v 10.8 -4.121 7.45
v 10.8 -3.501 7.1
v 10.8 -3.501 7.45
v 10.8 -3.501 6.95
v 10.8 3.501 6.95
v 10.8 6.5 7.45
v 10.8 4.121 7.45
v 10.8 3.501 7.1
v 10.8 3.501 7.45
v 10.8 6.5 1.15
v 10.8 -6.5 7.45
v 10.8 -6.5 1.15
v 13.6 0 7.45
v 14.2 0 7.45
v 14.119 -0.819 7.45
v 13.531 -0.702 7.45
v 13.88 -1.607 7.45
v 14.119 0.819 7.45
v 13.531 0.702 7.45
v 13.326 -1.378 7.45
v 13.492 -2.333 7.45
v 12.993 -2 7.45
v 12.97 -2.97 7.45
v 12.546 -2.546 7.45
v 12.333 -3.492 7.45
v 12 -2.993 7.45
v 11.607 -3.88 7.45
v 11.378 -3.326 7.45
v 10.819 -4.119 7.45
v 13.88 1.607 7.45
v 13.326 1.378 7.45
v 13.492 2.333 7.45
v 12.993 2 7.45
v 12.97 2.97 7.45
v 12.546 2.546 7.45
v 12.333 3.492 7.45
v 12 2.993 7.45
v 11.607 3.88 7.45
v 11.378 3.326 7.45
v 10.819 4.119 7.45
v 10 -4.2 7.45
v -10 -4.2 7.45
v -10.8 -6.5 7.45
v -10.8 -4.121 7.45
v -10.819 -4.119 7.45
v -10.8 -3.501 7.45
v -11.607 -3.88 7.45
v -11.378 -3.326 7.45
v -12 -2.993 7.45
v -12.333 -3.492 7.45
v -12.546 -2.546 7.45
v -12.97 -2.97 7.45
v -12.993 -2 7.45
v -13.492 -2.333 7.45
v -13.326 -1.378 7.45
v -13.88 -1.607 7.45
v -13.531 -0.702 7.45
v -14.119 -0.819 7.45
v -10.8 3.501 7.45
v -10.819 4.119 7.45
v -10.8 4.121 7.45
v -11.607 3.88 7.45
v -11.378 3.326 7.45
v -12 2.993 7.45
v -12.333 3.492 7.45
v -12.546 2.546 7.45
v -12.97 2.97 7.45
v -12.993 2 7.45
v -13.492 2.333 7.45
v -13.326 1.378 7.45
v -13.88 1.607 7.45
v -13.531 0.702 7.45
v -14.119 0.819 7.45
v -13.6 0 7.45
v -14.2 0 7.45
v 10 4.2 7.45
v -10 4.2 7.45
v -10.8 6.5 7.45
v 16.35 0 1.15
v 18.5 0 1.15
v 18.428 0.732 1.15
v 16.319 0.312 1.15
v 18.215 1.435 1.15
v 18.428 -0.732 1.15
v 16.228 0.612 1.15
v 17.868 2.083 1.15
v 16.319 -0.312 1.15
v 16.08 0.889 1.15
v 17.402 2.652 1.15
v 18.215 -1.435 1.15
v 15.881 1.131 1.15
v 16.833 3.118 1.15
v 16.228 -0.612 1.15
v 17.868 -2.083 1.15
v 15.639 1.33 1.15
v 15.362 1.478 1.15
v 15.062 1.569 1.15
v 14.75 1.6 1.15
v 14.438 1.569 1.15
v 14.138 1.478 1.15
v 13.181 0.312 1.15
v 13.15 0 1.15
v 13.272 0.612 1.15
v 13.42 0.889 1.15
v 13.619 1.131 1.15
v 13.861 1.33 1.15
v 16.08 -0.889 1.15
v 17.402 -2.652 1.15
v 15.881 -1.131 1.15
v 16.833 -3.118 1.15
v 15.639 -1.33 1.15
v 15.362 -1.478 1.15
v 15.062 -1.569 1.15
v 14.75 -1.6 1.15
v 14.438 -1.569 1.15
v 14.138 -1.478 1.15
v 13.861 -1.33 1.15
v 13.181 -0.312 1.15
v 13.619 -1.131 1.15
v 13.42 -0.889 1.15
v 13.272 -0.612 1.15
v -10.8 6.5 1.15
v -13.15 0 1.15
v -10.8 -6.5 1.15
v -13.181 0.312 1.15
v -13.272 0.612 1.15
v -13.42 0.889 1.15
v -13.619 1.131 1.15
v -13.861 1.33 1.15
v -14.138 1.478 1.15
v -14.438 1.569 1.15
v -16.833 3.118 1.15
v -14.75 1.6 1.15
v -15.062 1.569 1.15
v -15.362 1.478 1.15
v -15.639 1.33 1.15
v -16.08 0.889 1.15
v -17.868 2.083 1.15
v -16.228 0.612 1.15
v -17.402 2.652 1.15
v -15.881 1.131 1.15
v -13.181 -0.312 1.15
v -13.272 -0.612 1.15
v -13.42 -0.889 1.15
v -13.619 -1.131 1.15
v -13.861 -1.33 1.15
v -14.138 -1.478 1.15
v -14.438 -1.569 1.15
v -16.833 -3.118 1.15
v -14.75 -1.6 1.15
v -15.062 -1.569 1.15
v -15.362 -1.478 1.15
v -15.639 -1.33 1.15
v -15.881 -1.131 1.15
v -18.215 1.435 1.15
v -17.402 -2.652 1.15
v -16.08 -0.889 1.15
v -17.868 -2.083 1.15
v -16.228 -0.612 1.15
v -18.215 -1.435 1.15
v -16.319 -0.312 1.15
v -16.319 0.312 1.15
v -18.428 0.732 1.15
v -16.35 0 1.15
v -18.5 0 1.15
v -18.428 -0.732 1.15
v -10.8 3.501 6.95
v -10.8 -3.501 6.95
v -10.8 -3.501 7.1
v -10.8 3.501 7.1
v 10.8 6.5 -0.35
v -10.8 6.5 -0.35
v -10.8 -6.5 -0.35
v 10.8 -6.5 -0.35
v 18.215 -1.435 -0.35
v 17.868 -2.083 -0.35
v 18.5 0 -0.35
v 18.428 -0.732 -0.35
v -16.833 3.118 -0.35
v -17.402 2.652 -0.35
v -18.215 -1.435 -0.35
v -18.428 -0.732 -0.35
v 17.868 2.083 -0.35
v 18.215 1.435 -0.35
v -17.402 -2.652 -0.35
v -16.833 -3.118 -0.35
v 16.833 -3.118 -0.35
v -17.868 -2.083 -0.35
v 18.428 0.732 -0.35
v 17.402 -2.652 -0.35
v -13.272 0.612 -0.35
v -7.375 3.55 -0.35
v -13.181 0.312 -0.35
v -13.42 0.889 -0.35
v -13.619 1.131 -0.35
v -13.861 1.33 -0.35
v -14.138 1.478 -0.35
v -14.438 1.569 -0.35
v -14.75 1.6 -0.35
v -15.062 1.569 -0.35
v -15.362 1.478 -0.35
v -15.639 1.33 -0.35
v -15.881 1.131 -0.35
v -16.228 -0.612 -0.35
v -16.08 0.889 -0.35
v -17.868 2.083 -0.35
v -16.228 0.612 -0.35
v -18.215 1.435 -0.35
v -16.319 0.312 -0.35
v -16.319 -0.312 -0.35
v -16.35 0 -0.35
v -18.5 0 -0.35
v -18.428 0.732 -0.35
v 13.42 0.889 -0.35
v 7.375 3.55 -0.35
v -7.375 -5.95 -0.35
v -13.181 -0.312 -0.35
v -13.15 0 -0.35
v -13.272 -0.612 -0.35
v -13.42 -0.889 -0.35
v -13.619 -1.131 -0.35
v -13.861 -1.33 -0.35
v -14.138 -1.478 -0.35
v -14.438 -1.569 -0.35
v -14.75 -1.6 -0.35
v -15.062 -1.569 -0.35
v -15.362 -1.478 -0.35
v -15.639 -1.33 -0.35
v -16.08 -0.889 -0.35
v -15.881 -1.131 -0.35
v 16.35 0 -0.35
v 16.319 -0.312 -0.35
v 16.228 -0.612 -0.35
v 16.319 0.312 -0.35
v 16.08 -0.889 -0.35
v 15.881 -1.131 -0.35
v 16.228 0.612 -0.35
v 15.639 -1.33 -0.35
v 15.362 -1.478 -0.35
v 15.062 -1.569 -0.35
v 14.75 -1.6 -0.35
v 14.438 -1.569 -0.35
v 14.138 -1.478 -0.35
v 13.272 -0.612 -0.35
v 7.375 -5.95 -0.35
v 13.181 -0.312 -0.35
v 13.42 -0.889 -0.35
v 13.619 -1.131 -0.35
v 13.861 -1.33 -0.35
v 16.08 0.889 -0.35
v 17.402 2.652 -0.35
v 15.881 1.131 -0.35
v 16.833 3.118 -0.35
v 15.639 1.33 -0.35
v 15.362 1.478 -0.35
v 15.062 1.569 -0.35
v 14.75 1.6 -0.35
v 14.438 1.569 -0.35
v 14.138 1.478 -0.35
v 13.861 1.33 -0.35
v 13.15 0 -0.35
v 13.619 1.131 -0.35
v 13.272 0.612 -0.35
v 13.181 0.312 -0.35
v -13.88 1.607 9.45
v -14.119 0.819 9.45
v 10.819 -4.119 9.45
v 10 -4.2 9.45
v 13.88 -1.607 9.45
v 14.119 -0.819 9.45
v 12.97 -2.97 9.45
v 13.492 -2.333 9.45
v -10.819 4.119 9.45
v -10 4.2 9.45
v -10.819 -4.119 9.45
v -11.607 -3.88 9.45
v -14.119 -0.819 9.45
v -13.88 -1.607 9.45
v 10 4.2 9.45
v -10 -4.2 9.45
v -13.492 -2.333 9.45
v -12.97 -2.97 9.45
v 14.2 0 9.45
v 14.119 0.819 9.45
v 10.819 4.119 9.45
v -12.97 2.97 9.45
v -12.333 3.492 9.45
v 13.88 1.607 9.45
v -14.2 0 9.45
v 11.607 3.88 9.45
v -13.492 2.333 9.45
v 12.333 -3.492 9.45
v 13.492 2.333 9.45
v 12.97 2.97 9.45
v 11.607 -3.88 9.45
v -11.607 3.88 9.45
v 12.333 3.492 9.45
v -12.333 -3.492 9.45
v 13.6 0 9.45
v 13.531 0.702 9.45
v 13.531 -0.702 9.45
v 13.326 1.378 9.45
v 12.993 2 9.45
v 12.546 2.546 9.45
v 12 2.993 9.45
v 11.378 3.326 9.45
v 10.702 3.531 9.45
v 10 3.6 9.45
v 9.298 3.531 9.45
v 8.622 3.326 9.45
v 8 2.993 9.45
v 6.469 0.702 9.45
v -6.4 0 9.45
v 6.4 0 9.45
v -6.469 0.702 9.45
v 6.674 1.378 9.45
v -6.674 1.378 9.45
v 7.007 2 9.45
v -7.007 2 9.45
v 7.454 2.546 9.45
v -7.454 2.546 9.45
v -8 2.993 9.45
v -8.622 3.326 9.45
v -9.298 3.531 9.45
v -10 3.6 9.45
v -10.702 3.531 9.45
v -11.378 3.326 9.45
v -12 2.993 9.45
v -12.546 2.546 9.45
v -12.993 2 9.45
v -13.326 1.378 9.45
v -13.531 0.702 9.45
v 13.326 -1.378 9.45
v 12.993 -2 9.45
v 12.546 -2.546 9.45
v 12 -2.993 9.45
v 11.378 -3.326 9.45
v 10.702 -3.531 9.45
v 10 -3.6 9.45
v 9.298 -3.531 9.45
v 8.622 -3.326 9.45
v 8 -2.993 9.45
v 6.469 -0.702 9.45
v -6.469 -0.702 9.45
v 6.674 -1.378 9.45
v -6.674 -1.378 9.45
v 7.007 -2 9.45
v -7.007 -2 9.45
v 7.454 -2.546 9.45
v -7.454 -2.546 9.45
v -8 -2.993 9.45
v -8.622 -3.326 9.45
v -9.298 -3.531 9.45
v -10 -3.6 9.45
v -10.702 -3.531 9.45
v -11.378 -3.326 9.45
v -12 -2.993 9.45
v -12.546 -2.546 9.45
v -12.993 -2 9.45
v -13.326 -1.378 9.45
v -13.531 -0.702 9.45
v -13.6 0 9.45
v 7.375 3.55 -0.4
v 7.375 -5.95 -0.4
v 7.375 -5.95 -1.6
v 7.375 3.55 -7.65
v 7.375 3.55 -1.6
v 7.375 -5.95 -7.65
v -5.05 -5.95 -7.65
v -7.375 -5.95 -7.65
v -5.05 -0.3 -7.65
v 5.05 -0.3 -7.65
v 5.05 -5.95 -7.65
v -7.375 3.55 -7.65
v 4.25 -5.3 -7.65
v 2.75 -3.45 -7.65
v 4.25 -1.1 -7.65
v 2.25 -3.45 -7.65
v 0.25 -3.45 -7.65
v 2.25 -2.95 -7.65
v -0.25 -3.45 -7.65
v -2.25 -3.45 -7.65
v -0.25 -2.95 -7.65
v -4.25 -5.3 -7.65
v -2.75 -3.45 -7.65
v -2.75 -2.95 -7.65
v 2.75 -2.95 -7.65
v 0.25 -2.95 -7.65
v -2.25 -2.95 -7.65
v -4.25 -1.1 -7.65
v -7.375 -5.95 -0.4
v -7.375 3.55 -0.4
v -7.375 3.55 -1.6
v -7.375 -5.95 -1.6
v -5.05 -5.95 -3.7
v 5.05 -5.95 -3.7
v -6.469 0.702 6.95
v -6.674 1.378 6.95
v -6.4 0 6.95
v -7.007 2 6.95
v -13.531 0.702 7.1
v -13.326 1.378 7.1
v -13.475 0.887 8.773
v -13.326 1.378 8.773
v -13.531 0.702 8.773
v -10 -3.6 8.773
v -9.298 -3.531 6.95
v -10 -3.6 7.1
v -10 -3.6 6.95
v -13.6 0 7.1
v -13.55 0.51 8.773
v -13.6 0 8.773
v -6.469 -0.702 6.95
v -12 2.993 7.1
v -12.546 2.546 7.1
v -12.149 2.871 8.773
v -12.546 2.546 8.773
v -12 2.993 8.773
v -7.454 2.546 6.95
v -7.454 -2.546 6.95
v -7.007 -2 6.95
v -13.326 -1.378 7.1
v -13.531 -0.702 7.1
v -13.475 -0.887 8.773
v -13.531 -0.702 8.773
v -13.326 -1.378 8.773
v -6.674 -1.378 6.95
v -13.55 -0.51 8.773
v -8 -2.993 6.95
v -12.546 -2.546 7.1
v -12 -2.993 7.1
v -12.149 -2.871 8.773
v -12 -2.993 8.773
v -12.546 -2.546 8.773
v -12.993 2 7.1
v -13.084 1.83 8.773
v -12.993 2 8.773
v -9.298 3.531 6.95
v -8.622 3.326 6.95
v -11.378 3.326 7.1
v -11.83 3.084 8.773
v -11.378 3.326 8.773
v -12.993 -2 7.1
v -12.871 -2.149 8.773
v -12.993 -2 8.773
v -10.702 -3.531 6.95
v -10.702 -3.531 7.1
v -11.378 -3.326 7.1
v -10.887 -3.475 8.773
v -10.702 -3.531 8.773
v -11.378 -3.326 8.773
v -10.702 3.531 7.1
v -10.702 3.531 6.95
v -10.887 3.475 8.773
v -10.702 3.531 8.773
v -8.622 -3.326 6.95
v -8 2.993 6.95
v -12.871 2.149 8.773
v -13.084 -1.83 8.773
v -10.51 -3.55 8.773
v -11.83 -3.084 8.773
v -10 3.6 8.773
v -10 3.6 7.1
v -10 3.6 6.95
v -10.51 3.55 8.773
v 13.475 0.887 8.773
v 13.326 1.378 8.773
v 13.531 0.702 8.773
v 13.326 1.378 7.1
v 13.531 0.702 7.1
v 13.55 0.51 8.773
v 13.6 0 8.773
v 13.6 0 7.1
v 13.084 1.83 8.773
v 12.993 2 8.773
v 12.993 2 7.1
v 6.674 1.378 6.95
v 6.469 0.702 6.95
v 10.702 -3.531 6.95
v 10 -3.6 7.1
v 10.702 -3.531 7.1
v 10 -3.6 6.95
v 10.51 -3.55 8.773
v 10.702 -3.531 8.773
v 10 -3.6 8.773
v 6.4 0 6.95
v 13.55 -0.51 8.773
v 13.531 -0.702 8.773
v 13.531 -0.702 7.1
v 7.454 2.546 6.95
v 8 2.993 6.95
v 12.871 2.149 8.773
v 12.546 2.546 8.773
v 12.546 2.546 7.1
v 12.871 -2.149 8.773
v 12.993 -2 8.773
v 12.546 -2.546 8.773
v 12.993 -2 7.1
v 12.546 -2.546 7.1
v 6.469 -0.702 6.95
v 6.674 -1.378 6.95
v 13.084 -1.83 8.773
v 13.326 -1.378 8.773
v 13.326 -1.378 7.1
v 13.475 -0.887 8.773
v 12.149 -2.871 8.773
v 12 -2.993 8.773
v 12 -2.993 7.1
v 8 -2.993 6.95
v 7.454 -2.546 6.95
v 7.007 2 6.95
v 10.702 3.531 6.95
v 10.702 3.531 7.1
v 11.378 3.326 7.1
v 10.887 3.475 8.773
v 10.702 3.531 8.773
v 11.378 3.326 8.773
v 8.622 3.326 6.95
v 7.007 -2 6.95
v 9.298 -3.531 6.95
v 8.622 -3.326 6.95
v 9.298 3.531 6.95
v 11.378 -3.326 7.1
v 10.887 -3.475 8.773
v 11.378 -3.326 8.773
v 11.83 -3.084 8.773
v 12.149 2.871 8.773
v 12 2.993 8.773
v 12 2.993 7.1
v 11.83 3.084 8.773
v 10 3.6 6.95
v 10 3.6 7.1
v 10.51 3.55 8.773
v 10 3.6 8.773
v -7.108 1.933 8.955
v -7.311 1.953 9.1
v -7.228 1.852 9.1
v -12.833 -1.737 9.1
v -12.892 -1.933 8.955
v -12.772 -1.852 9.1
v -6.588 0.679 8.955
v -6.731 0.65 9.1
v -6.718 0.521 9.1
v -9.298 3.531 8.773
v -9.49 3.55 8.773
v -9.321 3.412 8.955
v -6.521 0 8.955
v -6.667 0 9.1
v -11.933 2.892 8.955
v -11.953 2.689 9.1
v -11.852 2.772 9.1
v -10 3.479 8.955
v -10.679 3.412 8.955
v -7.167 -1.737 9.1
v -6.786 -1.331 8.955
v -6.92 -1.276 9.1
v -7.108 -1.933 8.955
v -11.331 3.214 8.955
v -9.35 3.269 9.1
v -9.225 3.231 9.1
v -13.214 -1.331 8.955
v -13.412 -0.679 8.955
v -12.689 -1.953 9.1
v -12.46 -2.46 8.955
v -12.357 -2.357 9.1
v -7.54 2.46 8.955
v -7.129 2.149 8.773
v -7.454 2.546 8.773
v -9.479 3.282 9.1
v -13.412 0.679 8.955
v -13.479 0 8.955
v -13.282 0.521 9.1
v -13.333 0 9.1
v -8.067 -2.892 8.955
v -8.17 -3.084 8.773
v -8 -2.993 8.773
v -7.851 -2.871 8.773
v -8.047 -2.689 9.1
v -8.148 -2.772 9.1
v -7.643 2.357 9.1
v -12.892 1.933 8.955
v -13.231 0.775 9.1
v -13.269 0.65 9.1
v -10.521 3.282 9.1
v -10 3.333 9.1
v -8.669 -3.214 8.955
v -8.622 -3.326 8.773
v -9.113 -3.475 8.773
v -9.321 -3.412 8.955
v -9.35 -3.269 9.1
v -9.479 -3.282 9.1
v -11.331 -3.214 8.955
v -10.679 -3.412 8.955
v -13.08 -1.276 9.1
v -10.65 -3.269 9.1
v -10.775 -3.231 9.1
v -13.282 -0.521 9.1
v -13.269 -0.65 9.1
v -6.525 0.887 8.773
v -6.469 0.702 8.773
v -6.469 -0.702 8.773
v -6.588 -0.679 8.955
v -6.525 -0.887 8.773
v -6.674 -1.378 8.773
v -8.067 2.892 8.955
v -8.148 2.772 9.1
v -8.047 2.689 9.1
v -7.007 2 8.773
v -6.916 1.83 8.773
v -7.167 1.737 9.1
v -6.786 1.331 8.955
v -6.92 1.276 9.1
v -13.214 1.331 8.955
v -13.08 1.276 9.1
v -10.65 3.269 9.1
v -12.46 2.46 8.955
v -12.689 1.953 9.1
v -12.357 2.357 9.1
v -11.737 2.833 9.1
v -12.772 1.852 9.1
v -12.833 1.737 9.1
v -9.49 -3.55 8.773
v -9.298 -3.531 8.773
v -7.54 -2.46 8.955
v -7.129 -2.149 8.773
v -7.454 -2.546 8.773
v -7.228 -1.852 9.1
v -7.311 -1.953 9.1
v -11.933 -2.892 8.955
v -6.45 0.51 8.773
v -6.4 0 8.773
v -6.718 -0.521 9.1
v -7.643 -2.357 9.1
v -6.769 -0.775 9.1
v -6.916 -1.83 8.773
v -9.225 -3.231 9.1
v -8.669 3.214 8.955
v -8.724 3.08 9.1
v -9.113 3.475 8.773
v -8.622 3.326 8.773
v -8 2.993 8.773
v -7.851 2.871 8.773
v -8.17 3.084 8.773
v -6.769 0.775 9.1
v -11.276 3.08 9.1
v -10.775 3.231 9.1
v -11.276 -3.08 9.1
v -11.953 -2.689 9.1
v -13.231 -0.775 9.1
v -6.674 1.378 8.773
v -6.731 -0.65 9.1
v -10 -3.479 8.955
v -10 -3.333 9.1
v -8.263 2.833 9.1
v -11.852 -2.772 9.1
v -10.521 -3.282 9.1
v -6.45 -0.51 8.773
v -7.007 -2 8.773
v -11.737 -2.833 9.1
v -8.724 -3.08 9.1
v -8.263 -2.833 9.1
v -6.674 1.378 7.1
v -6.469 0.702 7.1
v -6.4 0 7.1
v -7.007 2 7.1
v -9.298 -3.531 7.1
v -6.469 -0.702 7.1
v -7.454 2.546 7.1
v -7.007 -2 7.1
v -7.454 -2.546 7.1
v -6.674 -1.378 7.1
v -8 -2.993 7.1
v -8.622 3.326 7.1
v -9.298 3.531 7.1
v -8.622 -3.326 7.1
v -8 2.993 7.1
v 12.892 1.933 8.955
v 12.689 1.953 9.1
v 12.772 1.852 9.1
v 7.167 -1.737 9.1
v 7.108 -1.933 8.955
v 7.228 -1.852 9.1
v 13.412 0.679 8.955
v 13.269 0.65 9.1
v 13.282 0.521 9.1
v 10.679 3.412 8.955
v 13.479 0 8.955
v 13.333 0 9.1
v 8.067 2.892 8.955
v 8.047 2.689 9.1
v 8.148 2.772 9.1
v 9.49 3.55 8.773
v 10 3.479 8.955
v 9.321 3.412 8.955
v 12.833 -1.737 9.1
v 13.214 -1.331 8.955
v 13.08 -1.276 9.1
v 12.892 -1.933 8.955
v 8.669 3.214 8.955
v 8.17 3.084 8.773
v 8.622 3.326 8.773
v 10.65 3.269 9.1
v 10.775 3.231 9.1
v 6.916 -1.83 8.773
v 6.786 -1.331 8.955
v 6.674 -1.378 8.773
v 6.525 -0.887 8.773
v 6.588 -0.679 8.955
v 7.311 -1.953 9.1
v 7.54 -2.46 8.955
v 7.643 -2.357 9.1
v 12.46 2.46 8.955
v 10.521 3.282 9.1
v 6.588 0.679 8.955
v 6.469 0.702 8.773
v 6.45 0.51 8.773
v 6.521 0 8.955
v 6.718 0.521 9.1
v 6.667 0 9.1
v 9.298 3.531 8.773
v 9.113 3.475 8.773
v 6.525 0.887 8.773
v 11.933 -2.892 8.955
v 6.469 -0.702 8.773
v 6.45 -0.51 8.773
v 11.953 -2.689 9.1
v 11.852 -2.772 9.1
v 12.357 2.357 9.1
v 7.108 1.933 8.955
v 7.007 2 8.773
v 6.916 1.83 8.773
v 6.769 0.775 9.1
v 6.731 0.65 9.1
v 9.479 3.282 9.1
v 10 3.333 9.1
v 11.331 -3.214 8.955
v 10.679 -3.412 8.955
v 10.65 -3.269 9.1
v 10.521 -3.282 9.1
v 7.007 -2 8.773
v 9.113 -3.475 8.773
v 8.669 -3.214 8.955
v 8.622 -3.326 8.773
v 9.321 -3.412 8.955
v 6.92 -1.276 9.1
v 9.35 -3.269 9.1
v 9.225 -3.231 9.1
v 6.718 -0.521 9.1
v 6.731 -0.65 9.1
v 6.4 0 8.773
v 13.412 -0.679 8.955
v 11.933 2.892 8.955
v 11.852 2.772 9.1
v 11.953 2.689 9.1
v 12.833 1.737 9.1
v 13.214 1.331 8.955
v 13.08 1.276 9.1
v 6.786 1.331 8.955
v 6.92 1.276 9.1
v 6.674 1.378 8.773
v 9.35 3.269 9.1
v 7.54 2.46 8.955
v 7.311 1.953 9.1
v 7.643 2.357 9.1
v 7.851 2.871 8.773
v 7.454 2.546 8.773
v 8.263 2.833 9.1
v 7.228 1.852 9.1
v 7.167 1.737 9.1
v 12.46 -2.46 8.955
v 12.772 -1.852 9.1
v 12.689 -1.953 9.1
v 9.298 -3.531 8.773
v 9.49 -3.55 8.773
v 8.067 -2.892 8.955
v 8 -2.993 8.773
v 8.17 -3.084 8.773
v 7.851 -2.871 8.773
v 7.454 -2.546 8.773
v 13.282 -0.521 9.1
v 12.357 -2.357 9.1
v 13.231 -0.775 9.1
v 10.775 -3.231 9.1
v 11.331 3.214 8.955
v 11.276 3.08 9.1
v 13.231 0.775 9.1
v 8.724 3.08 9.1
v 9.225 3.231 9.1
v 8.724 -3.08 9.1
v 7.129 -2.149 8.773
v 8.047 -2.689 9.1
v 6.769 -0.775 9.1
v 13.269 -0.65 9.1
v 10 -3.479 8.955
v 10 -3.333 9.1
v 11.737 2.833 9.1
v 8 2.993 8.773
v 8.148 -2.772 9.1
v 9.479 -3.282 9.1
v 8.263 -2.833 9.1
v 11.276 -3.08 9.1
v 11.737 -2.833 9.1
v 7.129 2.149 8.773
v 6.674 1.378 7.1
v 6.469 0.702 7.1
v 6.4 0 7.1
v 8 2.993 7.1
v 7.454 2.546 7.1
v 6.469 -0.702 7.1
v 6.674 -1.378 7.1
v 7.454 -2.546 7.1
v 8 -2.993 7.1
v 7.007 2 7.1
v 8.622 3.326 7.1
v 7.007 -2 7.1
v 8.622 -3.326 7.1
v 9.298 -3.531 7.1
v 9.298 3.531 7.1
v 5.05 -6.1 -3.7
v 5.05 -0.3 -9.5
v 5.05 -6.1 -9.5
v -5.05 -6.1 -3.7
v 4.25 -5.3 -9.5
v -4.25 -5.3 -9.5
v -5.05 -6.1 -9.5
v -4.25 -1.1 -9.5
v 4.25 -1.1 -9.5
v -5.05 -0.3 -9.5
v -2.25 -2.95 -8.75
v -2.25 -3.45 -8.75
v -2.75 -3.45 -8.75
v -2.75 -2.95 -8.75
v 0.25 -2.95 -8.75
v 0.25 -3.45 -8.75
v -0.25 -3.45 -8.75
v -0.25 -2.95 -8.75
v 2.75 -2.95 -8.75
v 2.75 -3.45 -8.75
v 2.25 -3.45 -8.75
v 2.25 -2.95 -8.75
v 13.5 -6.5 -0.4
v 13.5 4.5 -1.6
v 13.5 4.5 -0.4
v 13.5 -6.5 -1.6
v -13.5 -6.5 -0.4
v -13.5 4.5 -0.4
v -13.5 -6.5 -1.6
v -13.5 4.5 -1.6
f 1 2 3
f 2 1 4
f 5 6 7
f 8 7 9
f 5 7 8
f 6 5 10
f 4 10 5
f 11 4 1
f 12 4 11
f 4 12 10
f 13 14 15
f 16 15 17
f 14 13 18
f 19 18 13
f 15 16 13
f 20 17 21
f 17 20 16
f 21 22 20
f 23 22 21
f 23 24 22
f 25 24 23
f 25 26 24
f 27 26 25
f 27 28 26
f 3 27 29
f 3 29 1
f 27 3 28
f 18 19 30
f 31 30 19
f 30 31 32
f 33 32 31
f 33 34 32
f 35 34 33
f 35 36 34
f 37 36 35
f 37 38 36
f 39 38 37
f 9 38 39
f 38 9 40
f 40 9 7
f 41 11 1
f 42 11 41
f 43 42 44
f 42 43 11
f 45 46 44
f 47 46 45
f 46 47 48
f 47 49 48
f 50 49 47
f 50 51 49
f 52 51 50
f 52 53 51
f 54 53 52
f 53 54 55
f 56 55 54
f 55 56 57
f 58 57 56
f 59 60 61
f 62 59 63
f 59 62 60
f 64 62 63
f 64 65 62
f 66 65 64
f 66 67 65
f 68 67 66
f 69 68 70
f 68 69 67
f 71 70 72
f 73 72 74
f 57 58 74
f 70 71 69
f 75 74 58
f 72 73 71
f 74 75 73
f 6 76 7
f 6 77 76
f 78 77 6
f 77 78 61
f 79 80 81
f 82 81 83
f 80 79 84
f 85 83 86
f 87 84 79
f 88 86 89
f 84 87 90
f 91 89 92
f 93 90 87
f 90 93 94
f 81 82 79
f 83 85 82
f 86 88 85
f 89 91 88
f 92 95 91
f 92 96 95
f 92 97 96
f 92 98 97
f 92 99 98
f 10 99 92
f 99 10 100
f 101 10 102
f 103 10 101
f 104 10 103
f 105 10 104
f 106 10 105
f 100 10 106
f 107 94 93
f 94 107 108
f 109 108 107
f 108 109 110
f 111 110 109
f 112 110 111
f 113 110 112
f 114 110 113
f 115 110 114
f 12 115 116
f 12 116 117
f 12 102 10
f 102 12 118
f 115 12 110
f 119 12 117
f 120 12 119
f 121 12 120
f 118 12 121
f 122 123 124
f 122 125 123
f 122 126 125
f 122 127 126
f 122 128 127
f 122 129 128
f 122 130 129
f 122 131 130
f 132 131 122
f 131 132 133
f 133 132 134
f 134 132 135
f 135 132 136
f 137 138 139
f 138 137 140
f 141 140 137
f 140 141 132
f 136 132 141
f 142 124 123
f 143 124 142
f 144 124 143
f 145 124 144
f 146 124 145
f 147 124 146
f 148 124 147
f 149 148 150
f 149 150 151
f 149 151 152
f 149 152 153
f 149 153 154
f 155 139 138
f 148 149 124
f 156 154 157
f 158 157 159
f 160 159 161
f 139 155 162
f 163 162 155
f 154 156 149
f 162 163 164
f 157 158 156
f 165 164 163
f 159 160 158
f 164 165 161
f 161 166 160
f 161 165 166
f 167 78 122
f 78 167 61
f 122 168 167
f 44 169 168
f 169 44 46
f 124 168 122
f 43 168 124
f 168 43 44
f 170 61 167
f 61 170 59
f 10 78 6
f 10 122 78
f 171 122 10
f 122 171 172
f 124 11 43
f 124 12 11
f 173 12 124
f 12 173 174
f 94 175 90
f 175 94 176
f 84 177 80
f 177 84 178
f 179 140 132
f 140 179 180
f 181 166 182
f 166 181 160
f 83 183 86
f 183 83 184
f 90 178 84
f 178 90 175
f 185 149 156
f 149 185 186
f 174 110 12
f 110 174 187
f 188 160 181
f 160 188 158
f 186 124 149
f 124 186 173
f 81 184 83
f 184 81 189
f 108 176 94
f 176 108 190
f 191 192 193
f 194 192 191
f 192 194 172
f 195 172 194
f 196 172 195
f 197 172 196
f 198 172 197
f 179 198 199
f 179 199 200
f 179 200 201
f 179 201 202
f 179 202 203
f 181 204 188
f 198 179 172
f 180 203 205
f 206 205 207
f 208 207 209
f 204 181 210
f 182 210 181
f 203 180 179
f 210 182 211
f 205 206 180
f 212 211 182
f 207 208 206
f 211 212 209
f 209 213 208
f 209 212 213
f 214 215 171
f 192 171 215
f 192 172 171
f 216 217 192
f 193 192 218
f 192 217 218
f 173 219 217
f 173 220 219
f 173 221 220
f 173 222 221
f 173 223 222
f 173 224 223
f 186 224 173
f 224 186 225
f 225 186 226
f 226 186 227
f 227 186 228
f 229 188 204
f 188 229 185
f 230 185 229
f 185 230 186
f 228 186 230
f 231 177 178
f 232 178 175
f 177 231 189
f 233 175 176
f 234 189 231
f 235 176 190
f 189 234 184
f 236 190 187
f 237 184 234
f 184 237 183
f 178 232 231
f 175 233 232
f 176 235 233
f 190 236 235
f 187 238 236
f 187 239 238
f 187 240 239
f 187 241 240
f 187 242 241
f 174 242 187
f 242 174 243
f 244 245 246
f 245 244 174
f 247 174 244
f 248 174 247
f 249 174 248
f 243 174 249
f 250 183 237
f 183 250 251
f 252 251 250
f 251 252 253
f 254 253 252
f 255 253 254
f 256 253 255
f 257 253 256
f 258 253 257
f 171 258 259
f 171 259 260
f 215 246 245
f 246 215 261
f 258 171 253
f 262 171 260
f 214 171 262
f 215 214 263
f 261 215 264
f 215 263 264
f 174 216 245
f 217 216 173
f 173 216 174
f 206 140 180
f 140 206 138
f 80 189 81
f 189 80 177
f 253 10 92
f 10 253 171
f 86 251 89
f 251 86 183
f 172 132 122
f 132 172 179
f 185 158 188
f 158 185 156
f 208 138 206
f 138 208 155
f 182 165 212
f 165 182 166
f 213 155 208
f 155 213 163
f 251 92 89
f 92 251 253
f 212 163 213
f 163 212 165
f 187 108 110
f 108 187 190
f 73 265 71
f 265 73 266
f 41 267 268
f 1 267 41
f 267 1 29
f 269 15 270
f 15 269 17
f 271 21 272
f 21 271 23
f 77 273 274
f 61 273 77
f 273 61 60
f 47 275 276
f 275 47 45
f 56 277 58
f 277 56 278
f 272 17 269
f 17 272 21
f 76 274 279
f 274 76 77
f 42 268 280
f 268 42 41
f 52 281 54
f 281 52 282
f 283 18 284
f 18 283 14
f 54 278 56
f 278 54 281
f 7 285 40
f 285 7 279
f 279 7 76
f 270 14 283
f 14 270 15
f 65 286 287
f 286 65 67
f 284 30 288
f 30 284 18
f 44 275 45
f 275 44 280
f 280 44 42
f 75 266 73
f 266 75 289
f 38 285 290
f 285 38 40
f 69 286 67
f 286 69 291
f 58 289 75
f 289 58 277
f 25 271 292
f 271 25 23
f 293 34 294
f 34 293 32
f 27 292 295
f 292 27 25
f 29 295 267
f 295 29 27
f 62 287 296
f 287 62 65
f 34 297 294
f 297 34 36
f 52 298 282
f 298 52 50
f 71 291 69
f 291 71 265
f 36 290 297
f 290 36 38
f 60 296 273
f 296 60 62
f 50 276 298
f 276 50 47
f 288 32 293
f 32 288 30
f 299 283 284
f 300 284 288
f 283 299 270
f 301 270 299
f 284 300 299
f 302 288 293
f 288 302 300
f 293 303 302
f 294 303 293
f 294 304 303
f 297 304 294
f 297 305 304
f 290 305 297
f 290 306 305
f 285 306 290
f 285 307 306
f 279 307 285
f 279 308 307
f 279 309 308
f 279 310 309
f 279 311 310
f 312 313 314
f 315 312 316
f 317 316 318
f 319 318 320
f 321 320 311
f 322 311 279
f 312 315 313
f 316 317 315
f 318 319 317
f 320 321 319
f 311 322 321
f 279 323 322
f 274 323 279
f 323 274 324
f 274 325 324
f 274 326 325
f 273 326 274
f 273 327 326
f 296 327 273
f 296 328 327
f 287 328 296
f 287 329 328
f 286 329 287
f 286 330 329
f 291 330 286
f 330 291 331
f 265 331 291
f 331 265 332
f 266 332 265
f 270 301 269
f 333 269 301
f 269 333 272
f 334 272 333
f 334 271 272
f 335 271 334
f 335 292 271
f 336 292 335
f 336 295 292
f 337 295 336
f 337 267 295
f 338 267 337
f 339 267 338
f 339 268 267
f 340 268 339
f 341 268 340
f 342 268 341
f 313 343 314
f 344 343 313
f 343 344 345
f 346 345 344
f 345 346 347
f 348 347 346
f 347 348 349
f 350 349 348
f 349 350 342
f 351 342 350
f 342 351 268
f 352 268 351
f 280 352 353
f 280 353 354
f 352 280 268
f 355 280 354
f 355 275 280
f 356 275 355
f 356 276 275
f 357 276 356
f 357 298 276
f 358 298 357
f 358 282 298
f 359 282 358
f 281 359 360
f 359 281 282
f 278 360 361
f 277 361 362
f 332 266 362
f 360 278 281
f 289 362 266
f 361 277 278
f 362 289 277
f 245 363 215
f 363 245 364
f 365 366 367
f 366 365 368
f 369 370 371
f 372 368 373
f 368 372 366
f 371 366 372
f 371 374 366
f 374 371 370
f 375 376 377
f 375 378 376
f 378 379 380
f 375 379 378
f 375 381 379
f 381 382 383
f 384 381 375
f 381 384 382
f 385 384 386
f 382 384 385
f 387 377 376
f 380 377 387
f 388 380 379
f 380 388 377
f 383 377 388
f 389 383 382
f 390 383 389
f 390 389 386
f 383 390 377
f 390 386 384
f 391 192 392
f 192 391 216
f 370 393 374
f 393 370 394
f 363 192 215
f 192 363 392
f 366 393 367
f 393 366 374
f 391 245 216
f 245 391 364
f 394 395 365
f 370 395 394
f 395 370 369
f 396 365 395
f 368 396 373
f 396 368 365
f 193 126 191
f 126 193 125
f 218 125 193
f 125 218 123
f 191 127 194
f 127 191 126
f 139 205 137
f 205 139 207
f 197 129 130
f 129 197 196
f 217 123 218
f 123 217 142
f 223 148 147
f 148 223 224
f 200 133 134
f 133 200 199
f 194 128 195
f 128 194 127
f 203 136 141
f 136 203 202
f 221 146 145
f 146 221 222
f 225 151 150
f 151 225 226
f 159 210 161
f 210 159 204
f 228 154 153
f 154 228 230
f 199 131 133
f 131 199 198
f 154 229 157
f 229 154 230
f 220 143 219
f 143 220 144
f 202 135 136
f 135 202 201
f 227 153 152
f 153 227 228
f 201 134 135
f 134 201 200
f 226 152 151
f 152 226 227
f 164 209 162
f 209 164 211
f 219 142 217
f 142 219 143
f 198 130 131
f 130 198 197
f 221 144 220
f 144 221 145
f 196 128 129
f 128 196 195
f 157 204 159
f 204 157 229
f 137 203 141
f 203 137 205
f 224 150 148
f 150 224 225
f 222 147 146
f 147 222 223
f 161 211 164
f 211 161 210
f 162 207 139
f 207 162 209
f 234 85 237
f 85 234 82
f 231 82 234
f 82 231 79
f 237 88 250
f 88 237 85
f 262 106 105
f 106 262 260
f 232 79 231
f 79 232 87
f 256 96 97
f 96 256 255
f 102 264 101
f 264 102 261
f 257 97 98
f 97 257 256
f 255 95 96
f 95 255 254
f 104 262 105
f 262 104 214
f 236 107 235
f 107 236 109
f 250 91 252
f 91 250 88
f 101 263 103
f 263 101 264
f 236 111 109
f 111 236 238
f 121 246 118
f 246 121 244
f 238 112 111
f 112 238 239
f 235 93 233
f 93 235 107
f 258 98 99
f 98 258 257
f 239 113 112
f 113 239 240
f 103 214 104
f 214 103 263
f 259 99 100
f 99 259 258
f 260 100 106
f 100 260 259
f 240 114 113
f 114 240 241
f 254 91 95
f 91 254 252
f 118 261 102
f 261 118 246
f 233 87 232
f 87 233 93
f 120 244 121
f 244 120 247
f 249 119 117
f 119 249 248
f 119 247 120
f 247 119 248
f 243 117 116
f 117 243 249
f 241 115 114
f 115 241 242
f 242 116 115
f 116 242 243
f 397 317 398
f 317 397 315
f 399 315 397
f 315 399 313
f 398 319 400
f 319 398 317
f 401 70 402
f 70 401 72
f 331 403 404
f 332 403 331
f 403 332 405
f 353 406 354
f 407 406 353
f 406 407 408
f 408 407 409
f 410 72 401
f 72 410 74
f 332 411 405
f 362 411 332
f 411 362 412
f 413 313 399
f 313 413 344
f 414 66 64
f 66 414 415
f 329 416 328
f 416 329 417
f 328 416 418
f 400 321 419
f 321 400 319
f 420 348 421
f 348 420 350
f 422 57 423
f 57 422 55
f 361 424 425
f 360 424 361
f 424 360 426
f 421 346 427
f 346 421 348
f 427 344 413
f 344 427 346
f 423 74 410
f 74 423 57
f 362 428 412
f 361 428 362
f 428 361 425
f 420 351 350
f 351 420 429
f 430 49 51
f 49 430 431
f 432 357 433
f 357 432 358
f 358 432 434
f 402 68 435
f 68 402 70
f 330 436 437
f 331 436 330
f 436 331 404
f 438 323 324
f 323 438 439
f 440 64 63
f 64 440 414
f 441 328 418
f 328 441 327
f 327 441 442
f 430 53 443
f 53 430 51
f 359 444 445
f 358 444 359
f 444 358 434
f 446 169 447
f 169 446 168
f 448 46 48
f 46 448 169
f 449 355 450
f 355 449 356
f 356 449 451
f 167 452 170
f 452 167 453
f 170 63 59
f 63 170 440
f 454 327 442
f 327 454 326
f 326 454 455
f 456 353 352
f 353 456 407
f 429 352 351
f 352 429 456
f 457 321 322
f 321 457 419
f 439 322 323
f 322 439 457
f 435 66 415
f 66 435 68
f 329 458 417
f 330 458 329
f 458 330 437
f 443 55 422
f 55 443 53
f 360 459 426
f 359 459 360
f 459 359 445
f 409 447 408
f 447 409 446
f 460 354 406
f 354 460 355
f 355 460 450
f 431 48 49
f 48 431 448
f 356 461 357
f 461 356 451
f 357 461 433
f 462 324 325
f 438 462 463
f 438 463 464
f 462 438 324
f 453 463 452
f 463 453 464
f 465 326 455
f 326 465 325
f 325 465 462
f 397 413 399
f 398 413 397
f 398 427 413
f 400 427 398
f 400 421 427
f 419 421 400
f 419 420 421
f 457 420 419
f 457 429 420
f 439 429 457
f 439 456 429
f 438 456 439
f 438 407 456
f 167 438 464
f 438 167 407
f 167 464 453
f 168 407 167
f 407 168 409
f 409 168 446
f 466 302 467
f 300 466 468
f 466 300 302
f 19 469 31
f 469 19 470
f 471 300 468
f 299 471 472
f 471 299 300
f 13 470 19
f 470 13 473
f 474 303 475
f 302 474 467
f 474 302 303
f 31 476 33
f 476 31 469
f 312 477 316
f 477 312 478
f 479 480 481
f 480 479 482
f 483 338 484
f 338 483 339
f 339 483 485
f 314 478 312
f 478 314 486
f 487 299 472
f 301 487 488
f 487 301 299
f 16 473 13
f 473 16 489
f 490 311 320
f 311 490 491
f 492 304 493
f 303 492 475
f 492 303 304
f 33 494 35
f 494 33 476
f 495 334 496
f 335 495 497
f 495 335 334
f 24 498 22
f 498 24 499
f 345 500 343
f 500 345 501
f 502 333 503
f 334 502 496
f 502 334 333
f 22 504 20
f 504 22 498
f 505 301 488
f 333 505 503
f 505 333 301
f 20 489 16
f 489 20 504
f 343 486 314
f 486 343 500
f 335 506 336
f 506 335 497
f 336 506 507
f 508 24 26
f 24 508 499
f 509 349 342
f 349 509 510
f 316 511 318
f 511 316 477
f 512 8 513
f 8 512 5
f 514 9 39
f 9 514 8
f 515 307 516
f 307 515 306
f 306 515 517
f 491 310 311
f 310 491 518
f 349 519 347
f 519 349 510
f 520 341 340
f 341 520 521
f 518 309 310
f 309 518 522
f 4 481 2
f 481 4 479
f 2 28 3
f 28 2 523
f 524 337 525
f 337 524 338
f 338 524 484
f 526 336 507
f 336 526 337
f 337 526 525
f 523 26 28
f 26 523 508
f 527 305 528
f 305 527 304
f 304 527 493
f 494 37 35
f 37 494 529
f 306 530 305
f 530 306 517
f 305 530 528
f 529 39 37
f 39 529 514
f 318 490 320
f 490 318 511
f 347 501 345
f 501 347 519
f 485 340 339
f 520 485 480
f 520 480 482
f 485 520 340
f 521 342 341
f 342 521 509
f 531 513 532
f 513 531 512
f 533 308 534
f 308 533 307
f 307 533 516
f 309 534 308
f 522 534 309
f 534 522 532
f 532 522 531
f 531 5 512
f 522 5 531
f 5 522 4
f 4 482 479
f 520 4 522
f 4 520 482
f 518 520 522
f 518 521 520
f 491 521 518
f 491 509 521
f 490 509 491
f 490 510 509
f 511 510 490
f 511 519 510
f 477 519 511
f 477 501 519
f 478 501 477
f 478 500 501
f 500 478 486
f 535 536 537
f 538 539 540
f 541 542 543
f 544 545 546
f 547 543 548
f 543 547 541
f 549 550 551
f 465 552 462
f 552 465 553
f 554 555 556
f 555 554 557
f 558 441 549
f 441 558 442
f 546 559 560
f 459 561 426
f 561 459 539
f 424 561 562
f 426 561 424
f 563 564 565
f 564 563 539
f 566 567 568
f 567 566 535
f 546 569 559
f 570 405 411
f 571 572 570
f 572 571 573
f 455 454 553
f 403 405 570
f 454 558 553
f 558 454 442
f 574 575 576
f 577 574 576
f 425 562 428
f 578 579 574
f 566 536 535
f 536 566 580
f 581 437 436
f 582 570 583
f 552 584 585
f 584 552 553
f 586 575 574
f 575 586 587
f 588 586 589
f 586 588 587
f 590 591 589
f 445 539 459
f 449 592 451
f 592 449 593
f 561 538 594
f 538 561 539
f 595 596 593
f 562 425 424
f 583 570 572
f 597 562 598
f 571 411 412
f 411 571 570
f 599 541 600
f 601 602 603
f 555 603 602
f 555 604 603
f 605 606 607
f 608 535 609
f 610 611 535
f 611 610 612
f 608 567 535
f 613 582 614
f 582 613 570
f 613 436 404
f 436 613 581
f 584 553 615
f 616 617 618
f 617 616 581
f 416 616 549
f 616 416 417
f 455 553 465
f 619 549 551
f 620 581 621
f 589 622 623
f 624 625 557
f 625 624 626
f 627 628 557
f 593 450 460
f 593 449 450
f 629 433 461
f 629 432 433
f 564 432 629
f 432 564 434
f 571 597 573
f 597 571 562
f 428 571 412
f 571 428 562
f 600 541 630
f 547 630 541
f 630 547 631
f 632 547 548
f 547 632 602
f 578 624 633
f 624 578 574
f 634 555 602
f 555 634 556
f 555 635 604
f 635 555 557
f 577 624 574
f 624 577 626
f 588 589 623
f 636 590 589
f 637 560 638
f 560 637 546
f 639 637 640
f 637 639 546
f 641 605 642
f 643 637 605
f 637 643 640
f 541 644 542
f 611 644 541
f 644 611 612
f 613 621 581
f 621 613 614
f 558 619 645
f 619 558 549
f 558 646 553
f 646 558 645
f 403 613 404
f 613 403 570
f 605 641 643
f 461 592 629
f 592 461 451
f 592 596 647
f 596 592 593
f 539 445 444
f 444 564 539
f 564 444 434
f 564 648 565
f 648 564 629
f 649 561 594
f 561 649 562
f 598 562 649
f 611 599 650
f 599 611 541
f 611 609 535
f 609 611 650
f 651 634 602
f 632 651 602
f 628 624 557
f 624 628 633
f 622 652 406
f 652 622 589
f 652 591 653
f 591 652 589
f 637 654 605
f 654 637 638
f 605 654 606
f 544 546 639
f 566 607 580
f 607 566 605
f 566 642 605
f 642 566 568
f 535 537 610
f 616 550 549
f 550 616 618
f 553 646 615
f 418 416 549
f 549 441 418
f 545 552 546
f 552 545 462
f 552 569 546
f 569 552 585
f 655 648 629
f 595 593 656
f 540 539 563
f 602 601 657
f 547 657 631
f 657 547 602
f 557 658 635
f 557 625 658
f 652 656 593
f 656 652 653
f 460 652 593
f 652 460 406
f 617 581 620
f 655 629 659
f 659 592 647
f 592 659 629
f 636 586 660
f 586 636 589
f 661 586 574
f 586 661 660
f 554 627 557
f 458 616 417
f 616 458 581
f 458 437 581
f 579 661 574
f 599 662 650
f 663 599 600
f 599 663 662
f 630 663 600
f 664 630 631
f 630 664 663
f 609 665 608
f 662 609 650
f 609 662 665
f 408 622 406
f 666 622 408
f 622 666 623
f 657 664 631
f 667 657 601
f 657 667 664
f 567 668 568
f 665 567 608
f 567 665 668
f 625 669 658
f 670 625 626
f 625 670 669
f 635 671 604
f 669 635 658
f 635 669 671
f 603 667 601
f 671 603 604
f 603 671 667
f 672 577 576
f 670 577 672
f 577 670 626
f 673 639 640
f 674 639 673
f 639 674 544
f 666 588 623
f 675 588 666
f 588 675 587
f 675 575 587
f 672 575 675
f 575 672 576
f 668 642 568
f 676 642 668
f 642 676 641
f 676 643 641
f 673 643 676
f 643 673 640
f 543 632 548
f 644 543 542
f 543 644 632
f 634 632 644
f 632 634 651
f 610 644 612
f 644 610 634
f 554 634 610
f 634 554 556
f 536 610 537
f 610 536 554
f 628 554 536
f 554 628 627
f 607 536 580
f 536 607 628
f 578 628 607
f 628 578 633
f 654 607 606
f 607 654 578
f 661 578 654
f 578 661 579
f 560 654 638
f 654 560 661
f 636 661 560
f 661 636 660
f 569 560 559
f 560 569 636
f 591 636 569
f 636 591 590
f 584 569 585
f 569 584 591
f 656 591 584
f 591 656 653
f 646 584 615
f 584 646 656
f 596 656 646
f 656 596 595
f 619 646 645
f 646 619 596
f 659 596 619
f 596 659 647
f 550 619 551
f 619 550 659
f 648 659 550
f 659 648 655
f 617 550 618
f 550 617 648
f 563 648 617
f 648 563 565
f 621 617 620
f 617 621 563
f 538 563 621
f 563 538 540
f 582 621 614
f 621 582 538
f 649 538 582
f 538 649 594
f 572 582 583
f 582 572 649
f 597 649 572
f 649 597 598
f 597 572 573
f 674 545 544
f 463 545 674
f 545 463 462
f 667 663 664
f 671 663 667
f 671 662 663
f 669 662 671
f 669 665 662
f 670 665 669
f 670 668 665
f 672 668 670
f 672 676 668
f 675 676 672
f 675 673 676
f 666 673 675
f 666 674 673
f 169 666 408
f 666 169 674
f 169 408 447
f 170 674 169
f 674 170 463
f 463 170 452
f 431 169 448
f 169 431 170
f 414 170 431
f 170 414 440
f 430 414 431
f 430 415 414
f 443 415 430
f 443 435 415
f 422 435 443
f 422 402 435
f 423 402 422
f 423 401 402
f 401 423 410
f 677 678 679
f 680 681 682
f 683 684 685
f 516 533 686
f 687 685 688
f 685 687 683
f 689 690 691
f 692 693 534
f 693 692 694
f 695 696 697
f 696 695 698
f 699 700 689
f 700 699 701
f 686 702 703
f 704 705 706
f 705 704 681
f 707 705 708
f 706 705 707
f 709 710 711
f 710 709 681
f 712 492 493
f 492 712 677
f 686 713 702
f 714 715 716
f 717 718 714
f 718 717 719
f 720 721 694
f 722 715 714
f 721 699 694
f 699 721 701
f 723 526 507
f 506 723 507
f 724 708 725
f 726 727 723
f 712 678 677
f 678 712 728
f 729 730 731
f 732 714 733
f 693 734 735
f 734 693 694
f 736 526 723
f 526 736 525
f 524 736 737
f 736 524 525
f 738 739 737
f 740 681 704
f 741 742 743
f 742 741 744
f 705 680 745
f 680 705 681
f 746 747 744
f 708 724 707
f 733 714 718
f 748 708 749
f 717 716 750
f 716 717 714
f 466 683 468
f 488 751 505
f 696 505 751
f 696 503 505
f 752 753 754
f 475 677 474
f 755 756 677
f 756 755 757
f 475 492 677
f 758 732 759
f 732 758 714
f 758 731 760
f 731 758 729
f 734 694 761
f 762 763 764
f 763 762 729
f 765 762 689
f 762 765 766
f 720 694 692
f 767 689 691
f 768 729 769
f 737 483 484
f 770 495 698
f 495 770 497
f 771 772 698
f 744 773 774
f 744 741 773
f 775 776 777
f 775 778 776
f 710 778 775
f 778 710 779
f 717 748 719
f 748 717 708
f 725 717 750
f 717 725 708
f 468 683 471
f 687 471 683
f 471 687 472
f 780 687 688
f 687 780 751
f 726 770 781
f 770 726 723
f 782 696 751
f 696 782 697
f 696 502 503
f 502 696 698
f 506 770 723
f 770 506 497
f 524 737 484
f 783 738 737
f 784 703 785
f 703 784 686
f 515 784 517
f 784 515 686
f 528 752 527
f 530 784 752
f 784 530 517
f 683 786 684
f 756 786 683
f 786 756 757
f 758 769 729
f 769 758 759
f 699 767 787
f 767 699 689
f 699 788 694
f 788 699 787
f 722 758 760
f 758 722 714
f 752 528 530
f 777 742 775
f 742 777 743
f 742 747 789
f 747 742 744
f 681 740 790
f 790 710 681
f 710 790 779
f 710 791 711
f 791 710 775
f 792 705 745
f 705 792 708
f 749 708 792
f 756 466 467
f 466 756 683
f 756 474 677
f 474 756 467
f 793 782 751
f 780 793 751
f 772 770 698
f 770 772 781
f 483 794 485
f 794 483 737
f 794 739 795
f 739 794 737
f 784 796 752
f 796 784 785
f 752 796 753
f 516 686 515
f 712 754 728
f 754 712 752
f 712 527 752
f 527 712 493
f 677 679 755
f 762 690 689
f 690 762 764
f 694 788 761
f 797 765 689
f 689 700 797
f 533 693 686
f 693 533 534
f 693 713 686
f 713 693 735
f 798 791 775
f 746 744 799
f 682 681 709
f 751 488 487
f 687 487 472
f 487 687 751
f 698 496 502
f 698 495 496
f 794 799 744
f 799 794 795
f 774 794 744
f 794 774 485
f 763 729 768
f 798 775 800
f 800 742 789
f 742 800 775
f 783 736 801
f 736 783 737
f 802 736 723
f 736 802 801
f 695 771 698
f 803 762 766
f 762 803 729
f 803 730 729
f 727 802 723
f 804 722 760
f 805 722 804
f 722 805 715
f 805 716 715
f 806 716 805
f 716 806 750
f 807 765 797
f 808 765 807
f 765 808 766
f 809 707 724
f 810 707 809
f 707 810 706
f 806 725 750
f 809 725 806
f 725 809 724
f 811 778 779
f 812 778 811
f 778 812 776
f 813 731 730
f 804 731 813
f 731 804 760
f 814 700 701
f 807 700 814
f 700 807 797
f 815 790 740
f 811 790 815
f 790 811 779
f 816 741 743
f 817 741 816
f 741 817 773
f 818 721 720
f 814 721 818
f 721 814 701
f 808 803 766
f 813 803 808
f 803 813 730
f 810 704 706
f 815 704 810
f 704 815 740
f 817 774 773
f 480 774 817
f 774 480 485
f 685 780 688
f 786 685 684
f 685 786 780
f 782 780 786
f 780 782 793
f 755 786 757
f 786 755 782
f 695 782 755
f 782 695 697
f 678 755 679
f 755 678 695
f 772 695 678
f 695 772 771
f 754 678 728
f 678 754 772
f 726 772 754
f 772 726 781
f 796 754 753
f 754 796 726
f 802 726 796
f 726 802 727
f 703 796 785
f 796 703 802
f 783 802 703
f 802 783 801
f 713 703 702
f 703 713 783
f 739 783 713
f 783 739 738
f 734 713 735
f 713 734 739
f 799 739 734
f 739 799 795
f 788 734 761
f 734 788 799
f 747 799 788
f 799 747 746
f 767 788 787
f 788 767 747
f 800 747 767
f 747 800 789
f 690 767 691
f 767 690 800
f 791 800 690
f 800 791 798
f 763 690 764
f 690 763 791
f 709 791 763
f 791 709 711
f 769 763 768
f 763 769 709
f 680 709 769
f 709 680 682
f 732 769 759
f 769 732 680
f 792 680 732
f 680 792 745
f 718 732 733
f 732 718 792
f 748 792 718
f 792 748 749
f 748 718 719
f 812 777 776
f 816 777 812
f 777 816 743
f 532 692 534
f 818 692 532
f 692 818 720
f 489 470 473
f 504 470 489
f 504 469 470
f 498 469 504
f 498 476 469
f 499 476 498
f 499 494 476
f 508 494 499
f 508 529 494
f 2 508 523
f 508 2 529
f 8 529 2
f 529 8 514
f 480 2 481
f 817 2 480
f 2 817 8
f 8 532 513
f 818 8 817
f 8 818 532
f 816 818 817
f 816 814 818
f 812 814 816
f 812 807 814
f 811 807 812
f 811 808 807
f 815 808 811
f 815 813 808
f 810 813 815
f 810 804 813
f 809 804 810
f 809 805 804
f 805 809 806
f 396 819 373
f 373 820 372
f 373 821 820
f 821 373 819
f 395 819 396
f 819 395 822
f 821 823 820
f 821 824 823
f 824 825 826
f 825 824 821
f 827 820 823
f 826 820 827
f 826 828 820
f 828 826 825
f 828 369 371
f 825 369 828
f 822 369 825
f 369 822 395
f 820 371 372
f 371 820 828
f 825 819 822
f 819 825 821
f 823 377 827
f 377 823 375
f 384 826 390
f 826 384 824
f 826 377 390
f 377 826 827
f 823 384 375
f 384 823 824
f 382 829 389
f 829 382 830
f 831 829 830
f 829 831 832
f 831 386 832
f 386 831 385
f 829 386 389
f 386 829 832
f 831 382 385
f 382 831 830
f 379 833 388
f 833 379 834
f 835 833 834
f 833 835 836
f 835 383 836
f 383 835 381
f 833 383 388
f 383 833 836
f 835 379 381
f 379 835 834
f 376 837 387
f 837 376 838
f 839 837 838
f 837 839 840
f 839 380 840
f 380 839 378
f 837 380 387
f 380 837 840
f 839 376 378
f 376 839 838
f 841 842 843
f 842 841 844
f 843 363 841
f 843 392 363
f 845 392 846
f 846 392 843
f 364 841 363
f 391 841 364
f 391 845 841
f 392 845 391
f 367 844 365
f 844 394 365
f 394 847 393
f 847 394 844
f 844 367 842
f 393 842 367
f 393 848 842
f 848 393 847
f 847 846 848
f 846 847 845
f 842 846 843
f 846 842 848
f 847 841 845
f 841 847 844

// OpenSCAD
// Sharp GP2Y0A21YK0F Distance Measuring Sensor
// Units: mm
// Origin: Center of main body
// Orientation: +Z = Lens (Optical output), -Z = Mount / PWB / Connector

$fn = 32;

// Color Definitions
case_color = [0.18, 0.18, 0.20];       // Black Carbonic ABS
lens_color = [0.15, 0.12, 0.20, 0.85]; // Dark Tinted Acrylic Lens
pwb_color  = [0.55, 0.35, 0.15];       // Brown Paper Phenol PWB
conn_color = [0.90, 0.90, 0.85];       // Off-white Connector Plastic
pin_color  = [0.85, 0.75, 0.30];       // Gold/Brass Pins

module gp2y0a21yk0f() {
    // Dimensions from datasheet
    total_length   = 37.0;
    hole_pitch     = 29.5;
    hole_dia       = 3.2;
    ear_radius     = 3.75;
    ear_thick      = 1.5;
    
    body_width     = 13.0;
    body_length    = 21.6;
    case_depth     = 6.3;
    
    lens_pitch     = 20.0;
    lens_bezel_h   = 8.4;
    lens_bezel_th  = 2.0;
    lens_dia       = 7.2;

    pwb_thick      = 1.2;
    conn_width     = 10.1;
    
    // --- 1. Main Black Carbonic ABS Case ---
    color(case_color) {
        difference() {
            union() {
                // Main body block
                translate([0, 0, 4.3])
                    cube([body_length, body_width, case_depth], center=true);

                // Mounting ears (Flange)
                translate([0, 0, 0.4])
                    hull() {
                        translate([-hole_pitch/2, 0, 0]) cylinder(r=ear_radius, h=ear_thick, center=true);
                        translate([ hole_pitch/2, 0, 0]) cylinder(r=ear_radius, h=ear_thick, center=true);
                        cube([body_length, body_width, ear_thick], center=true);
                    }

                // Front Lens Bezel (protrusion)
                translate([0, 0, 8.45])
                    hull() {
                        translate([-lens_pitch/2, 0, 0]) cylinder(d=lens_bezel_h, h=lens_bezel_th, center=true);
                        translate([ lens_pitch/2, 0, 0]) cylinder(d=lens_bezel_h, h=lens_bezel_th, center=true);
                    }

                // Rear Connector Housing Structure
                translate([0, -1.2, -4.0])
                    cube([14.75, 9.5, 7.3], center=true);
            }

            // Mounting Screw Holes
            translate([-hole_pitch/2, 0, 0]) cylinder(d=hole_dia, h=10, center=true);
            translate([ hole_pitch/2, 0, 0]) cylinder(d=hole_dia, h=10, center=true);

            // Lens Recesses
            translate([-lens_pitch/2, 0, 8.45]) cylinder(d=lens_dia, h=3, center=true);
            translate([ lens_pitch/2, 0, 8.45]) cylinder(d=lens_dia, h=3, center=true);
        }
    }

    // --- 2. Acrylic Lenses (Light Emitter & Detector) ---
    color(lens_color) {
        for (x = [-lens_pitch/2, lens_pitch/2]) {
            translate([x, 0, 8.1])
                intersection() {
                    translate([0, 0, -2]) sphere(r=4.5);
                    cylinder(d=lens_dia, h=2.0, center=true);
                }
        }
    }

    // --- 3. Paper Phenol PWB ---
    color(pwb_color) {
        translate([0, -1.0, -1.0])
            cube([27.0, 11.0, pwb_thick], center=true);
    }

    // --- 4. 3-Pin Connector (JCTC 12001W90-3P-HF) ---
    color(conn_color) {
        translate([0, -3.2, -6.6])
            difference() {
                cube([conn_width, 5.8, 5.8], center=true);
                translate([0, 0, -1.0]) cube([8.5, 4.2, 5.0], center=true);
            }
    }

    // --- 5. Connector Pins ---
    color(pin_color) {
        for (x = [-2.5, 0, 2.5]) {
            translate([x, -3.2, -6.5])
                cube([0.5, 0.5, 4.5], center=true);
        }
    }
}

// Render Sensor Model
gp2y0a21yk0f();
